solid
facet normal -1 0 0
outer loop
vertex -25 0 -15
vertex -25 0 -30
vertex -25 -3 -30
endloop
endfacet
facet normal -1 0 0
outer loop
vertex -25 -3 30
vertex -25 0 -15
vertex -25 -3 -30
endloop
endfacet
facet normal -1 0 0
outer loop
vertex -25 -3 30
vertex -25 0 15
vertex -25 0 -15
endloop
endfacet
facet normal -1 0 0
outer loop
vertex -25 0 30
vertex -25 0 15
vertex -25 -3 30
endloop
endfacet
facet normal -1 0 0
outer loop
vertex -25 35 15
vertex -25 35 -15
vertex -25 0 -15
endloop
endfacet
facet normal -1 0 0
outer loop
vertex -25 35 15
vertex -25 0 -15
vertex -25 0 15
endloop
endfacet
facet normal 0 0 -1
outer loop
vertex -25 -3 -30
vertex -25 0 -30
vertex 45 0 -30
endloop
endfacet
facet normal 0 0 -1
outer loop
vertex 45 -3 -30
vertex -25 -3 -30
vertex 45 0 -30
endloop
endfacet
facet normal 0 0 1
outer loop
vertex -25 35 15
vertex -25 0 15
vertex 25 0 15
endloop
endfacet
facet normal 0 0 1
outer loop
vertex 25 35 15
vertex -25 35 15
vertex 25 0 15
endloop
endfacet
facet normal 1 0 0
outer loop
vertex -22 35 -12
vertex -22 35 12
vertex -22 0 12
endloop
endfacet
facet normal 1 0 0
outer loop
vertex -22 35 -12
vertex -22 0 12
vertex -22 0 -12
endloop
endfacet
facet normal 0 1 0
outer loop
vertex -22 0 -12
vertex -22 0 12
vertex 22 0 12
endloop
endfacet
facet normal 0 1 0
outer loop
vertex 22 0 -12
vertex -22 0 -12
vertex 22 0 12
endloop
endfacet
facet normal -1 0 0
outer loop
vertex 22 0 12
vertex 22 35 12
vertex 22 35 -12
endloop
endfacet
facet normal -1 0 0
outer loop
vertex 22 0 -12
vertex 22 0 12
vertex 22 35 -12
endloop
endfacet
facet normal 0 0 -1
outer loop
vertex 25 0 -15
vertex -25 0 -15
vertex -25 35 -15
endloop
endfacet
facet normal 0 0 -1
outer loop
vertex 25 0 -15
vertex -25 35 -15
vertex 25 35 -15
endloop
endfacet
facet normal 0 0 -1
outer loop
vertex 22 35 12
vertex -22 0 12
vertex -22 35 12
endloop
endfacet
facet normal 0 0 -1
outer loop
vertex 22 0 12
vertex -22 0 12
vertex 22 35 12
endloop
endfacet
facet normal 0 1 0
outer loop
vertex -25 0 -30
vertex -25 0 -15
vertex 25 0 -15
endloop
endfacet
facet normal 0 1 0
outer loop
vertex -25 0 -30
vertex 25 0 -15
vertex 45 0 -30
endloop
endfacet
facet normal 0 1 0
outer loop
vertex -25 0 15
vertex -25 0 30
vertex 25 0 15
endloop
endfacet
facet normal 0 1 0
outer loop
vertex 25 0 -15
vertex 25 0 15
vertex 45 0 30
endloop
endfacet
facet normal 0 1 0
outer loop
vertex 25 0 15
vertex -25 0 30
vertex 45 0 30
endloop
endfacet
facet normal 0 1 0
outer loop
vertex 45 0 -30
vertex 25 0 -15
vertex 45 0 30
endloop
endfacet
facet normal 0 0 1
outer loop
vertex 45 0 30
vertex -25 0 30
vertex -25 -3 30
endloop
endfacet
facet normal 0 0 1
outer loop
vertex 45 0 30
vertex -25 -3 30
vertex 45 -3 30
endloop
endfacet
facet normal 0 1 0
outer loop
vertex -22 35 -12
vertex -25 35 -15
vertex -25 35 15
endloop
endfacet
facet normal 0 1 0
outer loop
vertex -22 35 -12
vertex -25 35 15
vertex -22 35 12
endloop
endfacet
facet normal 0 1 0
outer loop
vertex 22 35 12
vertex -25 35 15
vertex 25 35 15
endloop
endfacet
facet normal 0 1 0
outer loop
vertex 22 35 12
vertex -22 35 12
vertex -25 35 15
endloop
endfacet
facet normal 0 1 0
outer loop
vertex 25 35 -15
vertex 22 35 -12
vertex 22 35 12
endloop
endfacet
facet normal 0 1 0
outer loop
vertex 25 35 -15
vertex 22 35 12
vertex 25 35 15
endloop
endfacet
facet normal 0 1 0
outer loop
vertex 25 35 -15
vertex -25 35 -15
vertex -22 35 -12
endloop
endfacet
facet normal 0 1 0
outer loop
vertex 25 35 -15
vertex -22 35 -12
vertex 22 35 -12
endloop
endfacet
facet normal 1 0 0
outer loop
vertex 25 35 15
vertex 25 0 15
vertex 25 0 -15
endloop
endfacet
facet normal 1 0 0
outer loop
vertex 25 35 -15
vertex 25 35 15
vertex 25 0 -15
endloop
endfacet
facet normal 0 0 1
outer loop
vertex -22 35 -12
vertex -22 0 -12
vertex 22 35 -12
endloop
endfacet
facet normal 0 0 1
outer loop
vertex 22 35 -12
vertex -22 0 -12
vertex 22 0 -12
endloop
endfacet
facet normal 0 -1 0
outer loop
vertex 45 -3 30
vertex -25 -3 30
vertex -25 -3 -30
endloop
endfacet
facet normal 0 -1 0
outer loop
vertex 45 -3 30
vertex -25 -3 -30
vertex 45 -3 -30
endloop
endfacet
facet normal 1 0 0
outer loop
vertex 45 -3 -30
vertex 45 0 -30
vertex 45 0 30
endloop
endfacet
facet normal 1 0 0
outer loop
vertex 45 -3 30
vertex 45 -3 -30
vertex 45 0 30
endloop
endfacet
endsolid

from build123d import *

# Parameters (mm, degrees)
SKETCH1_W           = 40
SKETCH1_H           = 20
BOSS_EXTRUDE1_DEPTH = 35
SKETCH2_W           = 50
SKETCH2_H           = 30
SKETCH2_W_2         = 44
SKETCH2_H_2         = 24
BOSS_EXTRUDE2_DEPTH = 35
SKETCH3_W           = 70
SKETCH3_H           = 60
BOSS_EXTRUDE4_DEPTH = 3
SKETCH6_W           = 40
SKETCH6_H           = 20
CUT_EXTRUDE1_DEPTH  = 35


with BuildPart() as part:
    # Sketch1 → Boss-Extrude1 (new body)
    with BuildSketch(Plane(origin=(0, 0, 0), x_dir=(1, 0, 0), z_dir=(0, 1, 0))):
        Rectangle(SKETCH1_W, SKETCH1_H)
    extrude(amount=BOSS_EXTRUDE1_DEPTH)



with BuildPart() as body_2:
    # Sketch2 → Boss-Extrude2 (new body)
    with BuildSketch(Plane(origin=(0, 0, 0), x_dir=(1, 0, 0), z_dir=(0, 1, 0))):
        Rectangle(SKETCH2_W, SKETCH2_H)
        Rectangle(SKETCH2_W_2, SKETCH2_H_2, mode=Mode.SUBTRACT)
    extrude(amount=BOSS_EXTRUDE2_DEPTH)


with BuildPart() as part_1:
    add(part.part)

    add(body_2.part)  # Boss-Extrude4 merges body 2
    # Sketch3 → Boss-Extrude4 (add)
    with BuildSketch(Plane.XZ):
        with Locations((10, 0)):
            Rectangle(SKETCH3_W, SKETCH3_H)
    extrude(amount=BOSS_EXTRUDE4_DEPTH)

    # Sketch6 → Cut-Extrude1 (cut)
    with BuildSketch(Plane(origin=(0, 35, 0), x_dir=(1, 0, 0), z_dir=(0, 1, 0))):
        Rectangle(SKETCH6_W, SKETCH6_H)
    extrude(amount=-CUT_EXTRUDE1_DEPTH, mode=Mode.SUBTRACT)


solid = part_1.part
